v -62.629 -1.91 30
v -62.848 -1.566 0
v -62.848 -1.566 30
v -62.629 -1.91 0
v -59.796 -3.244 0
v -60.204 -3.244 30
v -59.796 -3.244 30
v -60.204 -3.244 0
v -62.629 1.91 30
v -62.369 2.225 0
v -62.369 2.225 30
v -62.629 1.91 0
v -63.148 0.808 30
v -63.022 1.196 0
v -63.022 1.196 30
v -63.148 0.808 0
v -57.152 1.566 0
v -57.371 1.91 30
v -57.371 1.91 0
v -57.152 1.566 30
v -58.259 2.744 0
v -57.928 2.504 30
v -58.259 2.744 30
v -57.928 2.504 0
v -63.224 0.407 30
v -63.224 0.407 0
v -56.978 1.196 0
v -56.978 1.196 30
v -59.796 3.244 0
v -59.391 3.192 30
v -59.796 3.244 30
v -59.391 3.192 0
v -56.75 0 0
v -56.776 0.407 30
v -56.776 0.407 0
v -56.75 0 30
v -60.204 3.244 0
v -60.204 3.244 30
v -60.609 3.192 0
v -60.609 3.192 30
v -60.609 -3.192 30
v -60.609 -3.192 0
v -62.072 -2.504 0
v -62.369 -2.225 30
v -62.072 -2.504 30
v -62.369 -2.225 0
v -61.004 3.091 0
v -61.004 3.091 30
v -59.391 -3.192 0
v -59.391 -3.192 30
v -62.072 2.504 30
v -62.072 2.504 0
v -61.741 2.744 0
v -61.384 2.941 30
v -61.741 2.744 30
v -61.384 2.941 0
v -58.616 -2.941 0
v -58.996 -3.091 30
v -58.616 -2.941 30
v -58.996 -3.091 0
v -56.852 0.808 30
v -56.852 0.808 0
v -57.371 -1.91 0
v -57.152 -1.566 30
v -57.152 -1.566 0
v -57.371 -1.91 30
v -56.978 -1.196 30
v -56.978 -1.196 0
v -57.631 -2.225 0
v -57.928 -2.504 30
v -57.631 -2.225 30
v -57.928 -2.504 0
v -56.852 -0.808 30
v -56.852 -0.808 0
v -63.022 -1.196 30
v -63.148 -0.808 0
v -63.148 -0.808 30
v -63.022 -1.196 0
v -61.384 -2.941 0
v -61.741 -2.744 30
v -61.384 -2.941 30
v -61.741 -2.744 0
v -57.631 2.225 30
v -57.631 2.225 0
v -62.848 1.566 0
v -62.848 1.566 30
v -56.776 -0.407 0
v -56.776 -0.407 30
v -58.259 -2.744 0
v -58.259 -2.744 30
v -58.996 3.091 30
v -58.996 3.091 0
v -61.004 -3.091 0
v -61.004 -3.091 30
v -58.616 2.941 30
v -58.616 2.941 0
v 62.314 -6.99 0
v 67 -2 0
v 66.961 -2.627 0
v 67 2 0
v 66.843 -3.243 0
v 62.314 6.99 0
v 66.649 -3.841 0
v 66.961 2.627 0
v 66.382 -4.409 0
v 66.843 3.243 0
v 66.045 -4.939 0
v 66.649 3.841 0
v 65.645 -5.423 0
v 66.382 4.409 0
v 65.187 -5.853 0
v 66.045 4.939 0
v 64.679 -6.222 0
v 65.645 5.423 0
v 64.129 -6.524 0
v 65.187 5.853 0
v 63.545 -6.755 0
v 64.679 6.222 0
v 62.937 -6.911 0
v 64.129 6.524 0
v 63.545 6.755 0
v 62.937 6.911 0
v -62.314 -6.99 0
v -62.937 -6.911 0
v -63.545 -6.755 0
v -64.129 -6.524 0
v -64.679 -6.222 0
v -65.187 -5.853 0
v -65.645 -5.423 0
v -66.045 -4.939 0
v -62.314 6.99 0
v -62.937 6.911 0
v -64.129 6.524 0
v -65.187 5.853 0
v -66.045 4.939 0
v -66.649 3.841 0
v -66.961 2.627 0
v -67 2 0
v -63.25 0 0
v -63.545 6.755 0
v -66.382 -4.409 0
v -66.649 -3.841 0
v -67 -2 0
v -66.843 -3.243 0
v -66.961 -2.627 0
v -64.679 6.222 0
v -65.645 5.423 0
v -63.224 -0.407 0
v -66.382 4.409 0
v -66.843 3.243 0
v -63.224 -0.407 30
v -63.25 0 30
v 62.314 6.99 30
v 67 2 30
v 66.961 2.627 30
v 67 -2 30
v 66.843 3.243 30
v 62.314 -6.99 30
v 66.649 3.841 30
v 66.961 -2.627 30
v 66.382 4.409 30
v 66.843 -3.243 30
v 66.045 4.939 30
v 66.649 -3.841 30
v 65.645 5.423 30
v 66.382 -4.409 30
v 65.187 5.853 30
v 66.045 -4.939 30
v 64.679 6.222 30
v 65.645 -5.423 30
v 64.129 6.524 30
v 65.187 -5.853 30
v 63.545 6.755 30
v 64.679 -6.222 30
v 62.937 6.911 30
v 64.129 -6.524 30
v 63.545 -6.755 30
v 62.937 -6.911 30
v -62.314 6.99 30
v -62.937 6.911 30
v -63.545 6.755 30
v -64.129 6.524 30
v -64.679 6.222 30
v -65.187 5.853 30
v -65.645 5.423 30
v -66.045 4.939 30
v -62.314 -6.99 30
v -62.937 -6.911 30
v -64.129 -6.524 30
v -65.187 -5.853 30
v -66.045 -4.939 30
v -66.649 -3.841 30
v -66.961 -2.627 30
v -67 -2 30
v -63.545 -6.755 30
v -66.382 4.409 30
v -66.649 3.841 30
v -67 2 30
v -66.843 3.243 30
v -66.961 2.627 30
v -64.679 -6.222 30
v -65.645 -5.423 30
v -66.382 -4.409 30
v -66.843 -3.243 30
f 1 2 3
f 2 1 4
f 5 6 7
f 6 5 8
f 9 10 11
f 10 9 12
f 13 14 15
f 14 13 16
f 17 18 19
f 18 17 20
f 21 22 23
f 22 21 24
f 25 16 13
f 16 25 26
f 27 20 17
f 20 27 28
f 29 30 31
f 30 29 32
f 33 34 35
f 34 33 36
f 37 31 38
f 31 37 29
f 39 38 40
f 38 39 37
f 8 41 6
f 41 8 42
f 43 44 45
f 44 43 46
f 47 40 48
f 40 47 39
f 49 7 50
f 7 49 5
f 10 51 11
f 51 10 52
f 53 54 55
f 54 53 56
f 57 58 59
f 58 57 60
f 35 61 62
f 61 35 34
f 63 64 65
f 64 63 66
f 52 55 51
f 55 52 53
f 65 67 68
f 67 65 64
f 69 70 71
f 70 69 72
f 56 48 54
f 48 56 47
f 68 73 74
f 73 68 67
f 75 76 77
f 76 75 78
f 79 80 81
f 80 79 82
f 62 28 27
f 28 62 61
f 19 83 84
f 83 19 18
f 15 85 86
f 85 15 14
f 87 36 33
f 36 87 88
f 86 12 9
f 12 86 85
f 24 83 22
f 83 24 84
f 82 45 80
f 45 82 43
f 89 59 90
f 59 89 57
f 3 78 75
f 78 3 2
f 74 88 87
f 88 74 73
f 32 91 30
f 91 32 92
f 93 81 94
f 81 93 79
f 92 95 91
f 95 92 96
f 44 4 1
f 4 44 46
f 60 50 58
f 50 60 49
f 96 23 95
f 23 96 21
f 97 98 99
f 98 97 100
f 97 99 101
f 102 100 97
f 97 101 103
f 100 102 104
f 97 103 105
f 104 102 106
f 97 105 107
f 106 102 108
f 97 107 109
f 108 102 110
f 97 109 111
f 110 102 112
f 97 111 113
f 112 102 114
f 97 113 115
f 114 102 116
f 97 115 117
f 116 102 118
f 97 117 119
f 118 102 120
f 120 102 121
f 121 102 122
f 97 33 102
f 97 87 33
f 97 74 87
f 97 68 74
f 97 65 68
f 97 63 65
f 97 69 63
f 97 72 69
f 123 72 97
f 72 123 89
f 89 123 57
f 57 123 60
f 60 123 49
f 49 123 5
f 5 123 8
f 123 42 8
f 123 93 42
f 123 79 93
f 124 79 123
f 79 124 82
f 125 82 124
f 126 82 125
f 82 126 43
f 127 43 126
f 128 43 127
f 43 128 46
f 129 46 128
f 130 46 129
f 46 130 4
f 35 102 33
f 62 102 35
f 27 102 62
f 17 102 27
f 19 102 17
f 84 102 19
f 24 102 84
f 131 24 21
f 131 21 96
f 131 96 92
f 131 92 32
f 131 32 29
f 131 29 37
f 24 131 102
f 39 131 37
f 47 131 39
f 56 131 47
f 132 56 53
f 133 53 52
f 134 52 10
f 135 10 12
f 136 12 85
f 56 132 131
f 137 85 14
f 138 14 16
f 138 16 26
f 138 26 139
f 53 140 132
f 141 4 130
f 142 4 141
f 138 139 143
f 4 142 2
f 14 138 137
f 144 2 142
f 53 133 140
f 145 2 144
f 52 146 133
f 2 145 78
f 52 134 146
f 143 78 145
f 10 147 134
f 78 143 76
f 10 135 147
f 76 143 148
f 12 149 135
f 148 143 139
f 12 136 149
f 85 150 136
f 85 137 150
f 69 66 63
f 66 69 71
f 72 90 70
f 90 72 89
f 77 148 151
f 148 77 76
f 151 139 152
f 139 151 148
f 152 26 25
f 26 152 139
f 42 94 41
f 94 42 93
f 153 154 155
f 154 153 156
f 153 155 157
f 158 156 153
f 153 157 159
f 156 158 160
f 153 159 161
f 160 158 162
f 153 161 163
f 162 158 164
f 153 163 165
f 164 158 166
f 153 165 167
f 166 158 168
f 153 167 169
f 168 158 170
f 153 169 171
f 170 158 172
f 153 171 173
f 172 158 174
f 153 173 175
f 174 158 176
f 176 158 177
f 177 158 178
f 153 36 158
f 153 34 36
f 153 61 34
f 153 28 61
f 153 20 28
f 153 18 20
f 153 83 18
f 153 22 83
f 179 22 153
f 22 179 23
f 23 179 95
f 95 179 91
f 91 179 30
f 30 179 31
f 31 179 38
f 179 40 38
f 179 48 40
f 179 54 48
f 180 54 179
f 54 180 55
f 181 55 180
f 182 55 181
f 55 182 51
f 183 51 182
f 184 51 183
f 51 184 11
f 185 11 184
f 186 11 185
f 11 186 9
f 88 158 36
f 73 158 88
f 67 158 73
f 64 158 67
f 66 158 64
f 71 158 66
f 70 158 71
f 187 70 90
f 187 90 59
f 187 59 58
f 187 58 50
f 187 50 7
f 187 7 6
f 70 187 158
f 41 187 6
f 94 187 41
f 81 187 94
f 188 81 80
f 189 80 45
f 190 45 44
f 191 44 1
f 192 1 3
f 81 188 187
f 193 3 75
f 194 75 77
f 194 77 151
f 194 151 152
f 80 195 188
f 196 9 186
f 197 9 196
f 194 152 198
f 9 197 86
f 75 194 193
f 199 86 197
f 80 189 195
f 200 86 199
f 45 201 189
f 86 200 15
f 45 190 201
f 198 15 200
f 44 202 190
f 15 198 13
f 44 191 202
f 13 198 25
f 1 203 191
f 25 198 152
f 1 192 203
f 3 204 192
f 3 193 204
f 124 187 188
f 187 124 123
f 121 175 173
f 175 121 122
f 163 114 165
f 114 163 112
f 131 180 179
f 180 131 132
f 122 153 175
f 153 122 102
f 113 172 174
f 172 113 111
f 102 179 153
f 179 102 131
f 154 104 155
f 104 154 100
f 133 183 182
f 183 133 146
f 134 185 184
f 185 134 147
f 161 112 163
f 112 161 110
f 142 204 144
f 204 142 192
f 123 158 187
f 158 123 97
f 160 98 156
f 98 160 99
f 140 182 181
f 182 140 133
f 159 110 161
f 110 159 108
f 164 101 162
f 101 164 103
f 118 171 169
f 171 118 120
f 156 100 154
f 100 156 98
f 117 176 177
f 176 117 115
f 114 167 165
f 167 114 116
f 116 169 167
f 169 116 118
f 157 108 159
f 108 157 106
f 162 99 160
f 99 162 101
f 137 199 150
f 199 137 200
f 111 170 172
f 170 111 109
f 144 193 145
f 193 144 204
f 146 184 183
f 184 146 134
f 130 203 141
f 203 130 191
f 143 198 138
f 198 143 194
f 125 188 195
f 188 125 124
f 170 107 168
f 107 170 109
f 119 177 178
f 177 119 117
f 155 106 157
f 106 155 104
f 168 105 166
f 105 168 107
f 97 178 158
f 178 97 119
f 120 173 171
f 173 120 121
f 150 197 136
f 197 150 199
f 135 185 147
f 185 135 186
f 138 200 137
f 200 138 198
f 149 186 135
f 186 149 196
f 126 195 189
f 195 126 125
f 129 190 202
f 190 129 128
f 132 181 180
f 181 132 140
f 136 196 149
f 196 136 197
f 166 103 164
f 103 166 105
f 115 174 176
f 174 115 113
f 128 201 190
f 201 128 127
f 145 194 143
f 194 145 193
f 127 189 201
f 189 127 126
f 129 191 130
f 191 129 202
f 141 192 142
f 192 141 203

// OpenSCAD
$fn = 50;


difference() {
	union() {
		hull() {
			translate(v = [-62.0000000000, 2.0000000000, 0]) {
				cylinder(h = 30, r = 5);
			}
			translate(v = [62.0000000000, 2.0000000000, 0]) {
				cylinder(h = 30, r = 5);
			}
			translate(v = [-62.0000000000, -2.0000000000, 0]) {
				cylinder(h = 30, r = 5);
			}
			translate(v = [62.0000000000, -2.0000000000, 0]) {
				cylinder(h = 30, r = 5);
			}
		}
	}
	union() {
		translate(v = [-60.0000000000, 0.0000000000, 0]) {
			cylinder(h = 30, r = 3.2500000000);
		}
		translate(v = [-60.0000000000, 0.0000000000, 0]) {
			cylinder(h = 30, r = 1.8000000000);
		}
		translate(v = [-60.0000000000, 0.0000000000, 0]) {
			cylinder(h = 30, r = 1.8000000000);
		}
		translate(v = [-60.0000000000, 0.0000000000, 0]) {
			cylinder(h = 30, r = 1.8000000000);
		}
	}
}
